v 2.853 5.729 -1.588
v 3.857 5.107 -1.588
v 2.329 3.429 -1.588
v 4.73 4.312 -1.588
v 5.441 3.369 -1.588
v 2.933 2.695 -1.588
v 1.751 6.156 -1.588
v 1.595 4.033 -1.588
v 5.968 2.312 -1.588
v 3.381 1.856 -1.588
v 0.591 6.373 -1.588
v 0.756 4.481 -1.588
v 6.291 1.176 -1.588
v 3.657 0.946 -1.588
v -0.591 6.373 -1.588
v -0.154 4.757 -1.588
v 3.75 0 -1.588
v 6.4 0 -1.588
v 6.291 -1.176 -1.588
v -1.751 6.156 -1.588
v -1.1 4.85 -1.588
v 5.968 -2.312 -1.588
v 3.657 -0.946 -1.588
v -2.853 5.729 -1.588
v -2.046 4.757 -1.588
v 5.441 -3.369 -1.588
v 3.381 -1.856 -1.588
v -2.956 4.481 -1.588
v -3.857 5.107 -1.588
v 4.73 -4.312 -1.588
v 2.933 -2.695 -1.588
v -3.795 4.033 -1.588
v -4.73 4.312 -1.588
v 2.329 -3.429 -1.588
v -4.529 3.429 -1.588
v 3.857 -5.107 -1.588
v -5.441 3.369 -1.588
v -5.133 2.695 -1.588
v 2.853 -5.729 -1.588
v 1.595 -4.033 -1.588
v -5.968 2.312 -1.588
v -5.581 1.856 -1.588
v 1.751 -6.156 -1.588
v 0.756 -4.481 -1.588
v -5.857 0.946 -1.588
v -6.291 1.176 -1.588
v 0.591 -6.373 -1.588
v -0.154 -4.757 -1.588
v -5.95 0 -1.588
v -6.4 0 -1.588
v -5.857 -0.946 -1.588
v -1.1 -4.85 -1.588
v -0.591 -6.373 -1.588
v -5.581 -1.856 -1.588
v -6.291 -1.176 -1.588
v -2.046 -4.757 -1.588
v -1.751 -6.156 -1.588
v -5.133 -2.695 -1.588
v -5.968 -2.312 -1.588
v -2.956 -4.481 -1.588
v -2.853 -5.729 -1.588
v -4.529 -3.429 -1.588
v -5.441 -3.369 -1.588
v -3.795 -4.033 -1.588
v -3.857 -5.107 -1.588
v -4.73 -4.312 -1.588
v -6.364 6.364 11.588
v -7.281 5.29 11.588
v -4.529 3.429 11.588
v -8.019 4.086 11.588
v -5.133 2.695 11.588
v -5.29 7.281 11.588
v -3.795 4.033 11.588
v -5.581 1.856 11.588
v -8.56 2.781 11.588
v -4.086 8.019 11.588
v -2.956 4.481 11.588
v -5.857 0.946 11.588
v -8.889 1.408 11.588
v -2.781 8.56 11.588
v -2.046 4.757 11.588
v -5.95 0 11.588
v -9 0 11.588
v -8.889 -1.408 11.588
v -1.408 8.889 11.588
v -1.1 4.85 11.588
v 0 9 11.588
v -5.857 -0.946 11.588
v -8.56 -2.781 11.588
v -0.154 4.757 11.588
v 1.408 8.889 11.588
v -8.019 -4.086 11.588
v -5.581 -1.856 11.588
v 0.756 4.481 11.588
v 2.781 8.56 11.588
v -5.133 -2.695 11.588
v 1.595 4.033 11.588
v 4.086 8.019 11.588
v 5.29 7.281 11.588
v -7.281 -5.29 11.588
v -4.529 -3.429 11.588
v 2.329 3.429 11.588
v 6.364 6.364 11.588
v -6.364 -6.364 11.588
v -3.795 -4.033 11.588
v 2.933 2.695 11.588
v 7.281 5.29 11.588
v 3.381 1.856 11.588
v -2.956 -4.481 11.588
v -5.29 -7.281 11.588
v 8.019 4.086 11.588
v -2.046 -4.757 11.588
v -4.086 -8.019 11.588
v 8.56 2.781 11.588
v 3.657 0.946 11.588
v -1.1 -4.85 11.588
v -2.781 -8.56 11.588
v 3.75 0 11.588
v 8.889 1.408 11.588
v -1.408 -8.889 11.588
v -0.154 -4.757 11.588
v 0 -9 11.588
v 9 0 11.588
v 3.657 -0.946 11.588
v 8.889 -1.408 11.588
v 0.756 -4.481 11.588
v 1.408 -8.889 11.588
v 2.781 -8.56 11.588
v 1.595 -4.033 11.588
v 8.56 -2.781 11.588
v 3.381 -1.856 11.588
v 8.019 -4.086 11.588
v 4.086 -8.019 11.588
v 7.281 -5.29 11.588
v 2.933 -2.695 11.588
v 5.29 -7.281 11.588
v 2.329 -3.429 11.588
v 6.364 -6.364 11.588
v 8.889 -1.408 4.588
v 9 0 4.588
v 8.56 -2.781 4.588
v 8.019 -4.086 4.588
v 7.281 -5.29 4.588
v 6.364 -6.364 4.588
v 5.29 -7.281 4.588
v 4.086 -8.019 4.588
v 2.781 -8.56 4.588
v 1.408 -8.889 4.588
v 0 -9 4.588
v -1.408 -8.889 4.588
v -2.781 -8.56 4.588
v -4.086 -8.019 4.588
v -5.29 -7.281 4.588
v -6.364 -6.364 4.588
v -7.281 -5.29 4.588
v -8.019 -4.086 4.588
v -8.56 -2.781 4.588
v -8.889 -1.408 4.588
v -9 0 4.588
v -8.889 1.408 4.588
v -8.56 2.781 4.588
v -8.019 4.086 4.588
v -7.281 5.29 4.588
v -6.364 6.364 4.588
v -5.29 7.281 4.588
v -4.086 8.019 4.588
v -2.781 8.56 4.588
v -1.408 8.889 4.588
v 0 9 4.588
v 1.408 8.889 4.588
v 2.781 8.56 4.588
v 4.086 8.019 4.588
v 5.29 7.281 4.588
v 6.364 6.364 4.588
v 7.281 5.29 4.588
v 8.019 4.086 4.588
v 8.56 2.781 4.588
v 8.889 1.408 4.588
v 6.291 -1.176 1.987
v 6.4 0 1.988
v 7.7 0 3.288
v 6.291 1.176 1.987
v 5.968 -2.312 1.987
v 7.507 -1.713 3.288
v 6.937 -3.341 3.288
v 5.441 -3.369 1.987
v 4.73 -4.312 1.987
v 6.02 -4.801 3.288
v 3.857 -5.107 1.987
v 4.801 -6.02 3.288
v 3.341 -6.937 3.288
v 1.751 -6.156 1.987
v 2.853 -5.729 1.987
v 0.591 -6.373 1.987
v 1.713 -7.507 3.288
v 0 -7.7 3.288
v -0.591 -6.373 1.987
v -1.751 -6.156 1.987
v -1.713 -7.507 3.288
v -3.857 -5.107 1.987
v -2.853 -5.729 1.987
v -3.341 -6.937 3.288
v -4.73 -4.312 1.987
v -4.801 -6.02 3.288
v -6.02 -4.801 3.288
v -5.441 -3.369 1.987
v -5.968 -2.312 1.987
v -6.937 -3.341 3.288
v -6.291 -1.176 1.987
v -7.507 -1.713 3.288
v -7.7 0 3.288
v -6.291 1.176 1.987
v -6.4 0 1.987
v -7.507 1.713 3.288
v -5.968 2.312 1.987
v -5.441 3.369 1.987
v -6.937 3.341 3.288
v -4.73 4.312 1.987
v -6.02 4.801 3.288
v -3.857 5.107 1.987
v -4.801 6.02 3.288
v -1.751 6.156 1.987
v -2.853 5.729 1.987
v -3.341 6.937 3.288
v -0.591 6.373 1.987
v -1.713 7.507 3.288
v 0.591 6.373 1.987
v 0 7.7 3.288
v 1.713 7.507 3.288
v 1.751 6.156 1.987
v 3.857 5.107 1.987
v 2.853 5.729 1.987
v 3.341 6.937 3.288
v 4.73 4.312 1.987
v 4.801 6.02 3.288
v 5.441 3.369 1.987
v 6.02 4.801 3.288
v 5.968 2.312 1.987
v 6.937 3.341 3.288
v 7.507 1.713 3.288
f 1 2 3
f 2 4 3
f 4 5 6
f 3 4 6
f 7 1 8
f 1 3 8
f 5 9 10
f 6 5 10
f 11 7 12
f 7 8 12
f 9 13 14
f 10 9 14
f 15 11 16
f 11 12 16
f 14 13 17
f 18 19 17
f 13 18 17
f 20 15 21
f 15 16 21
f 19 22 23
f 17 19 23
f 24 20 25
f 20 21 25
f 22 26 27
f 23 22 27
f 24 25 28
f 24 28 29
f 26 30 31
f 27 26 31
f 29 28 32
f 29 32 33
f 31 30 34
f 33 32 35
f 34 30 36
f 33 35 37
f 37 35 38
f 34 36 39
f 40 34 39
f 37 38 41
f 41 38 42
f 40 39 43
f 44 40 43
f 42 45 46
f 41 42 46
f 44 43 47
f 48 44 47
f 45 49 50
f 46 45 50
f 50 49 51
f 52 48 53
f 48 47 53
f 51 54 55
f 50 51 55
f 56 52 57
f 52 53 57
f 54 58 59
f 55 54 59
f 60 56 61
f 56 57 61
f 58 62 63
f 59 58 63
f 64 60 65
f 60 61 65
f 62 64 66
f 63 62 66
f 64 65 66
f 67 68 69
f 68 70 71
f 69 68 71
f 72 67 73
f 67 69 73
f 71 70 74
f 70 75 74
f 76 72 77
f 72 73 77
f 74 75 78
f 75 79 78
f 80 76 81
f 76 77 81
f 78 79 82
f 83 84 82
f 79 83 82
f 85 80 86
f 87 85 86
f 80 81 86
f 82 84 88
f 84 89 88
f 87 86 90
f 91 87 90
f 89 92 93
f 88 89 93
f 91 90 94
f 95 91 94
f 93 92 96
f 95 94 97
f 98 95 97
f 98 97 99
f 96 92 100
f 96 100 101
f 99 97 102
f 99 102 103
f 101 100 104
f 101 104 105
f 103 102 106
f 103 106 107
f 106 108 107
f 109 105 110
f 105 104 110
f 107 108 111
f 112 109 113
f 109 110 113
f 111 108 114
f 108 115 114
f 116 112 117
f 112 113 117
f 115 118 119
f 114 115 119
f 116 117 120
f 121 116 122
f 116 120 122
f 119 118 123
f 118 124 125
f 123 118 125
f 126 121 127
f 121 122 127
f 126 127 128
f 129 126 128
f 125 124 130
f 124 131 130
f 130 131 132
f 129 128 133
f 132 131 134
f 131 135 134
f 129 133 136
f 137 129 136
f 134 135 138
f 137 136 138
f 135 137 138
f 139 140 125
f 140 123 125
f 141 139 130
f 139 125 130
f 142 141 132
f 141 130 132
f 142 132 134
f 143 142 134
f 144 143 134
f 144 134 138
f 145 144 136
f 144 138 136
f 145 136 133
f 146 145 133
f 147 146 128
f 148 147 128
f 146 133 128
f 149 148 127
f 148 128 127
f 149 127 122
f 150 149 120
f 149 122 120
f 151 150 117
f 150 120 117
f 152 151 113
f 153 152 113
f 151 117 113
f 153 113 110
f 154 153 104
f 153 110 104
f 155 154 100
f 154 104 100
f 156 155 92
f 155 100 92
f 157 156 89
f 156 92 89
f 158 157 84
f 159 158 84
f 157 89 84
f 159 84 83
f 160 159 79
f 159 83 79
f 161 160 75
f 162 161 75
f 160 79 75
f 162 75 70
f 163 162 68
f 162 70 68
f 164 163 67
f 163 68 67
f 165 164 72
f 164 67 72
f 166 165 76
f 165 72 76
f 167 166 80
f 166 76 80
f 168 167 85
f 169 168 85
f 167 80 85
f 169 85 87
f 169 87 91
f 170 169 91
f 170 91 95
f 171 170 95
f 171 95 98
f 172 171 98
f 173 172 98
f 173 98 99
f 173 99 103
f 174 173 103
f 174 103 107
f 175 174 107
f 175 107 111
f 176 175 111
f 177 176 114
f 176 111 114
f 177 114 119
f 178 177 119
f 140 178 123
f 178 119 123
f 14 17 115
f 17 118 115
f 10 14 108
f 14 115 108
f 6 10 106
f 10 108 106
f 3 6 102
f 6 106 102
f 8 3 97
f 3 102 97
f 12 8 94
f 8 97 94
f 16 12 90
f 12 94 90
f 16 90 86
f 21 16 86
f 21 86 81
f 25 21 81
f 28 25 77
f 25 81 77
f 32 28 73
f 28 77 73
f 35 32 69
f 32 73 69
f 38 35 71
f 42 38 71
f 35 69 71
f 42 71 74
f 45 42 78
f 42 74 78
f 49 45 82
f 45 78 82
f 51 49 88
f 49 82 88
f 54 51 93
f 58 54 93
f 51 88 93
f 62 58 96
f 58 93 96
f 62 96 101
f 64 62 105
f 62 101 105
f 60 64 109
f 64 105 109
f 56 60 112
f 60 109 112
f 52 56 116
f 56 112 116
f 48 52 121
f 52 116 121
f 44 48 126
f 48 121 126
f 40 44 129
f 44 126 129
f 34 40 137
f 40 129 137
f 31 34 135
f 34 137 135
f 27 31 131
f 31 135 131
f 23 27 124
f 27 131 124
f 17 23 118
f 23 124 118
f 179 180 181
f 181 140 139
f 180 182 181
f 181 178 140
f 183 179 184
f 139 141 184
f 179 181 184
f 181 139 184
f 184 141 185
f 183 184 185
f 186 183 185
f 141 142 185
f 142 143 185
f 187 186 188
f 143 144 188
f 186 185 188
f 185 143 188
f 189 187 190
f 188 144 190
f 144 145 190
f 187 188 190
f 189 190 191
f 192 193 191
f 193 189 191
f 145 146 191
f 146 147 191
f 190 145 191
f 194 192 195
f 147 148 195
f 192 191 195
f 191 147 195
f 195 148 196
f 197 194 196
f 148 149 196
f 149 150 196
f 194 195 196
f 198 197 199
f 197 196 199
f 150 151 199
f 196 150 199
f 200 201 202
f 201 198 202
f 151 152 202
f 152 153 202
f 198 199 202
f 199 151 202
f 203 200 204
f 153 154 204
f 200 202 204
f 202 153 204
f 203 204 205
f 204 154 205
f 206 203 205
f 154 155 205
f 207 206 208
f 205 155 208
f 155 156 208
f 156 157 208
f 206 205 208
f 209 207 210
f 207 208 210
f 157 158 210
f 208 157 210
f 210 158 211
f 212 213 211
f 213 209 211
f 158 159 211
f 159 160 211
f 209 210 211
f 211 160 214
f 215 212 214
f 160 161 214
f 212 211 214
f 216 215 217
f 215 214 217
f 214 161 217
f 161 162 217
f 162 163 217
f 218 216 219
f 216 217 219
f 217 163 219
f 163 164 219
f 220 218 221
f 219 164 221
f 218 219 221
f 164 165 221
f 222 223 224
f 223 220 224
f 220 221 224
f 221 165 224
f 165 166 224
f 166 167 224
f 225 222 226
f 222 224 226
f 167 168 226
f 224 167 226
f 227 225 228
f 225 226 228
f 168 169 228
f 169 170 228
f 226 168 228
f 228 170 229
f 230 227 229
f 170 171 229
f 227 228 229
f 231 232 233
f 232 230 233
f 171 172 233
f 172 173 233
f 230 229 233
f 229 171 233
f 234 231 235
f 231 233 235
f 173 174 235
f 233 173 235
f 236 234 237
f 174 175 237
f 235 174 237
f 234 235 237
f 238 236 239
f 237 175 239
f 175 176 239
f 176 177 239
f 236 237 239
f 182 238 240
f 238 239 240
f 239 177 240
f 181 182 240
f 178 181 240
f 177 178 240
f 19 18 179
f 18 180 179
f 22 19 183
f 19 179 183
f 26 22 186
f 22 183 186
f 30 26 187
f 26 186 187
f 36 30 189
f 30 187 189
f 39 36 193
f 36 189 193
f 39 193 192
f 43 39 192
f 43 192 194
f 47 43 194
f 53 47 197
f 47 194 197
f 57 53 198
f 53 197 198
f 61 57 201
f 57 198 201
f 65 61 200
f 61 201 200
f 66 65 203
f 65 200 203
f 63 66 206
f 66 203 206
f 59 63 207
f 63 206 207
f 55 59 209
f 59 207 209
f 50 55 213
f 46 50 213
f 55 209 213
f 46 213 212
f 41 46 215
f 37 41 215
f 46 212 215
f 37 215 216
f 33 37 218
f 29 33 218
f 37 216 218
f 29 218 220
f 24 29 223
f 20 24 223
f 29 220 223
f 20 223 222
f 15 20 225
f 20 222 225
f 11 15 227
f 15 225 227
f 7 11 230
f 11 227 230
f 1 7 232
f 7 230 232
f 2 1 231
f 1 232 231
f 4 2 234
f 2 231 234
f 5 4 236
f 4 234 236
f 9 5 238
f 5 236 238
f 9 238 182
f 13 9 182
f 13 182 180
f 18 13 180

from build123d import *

# Parameters (mm, degrees)
F0_W          = 6.4
F0_H          = 3.175
F2_S5_R       = 6.4
F2_T6_DEPTH   = 14
F3_R          = 4.85
F4_DEPTH      = 25
F4_DEPTH_BACK = 25


# Not quite as in the source:
# - a fillet or chamfer that OpenCascade refuses, or shapes differently, is made with other operations: its cross-section is extruded or revolved along the edge and cut away or added


with BuildPart() as f1:
    # F0 (on Front) → F1 (revolve)
    with BuildSketch(Plane.XZ):
        with Locations((3.2, 0)):
            Rectangle(F0_W, F0_H)
        Polygon((0, 1.5875), (6.4, 1.5875), (9, 1.5875), (9, 11.5875), (0, 11.5875), align=None)
    revolve(axis=Axis((0, 0, 6.5875), (0, 0, -1)))

    # F2: chamfer of 3 on 1 edges, made by hand


with BuildPart() as f2_tool2:
    # F2_s3 → F2_t4 (revolve)
    with BuildSketch(Plane.XZ):
        Polygon((6, 1.5875), (9, 4.5875), (9, 1.5875), align=None)
    revolve(axis=Axis((0, 0, 1.5875), (0, 0, -1)))

    # F2_s5 → F2_t6 (cut, symmetric)
    with BuildSketch(Plane.XY.offset(3.1)):
        Circle(F2_S5_R)
    extrude(amount=F2_T6_DEPTH, both=True, mode=Mode.SUBTRACT)


with BuildPart() as f1_1:
    add(f1.part)

    # F2_t1: cut F2_tool2
    add(f2_tool2.part, mode=Mode.SUBTRACT)

    # F3 (on Top) → F4 (cut, two sides)
    with BuildSketch(Plane.XY) as f4_sk:
        with Locations((-1.1, 0)):
            Circle(F3_R)
    extrude(amount=-F4_DEPTH, mode=Mode.SUBTRACT)
    extrude(f4_sk.sketch, amount=F4_DEPTH_BACK, mode=Mode.SUBTRACT)


solid = f1_1.part
